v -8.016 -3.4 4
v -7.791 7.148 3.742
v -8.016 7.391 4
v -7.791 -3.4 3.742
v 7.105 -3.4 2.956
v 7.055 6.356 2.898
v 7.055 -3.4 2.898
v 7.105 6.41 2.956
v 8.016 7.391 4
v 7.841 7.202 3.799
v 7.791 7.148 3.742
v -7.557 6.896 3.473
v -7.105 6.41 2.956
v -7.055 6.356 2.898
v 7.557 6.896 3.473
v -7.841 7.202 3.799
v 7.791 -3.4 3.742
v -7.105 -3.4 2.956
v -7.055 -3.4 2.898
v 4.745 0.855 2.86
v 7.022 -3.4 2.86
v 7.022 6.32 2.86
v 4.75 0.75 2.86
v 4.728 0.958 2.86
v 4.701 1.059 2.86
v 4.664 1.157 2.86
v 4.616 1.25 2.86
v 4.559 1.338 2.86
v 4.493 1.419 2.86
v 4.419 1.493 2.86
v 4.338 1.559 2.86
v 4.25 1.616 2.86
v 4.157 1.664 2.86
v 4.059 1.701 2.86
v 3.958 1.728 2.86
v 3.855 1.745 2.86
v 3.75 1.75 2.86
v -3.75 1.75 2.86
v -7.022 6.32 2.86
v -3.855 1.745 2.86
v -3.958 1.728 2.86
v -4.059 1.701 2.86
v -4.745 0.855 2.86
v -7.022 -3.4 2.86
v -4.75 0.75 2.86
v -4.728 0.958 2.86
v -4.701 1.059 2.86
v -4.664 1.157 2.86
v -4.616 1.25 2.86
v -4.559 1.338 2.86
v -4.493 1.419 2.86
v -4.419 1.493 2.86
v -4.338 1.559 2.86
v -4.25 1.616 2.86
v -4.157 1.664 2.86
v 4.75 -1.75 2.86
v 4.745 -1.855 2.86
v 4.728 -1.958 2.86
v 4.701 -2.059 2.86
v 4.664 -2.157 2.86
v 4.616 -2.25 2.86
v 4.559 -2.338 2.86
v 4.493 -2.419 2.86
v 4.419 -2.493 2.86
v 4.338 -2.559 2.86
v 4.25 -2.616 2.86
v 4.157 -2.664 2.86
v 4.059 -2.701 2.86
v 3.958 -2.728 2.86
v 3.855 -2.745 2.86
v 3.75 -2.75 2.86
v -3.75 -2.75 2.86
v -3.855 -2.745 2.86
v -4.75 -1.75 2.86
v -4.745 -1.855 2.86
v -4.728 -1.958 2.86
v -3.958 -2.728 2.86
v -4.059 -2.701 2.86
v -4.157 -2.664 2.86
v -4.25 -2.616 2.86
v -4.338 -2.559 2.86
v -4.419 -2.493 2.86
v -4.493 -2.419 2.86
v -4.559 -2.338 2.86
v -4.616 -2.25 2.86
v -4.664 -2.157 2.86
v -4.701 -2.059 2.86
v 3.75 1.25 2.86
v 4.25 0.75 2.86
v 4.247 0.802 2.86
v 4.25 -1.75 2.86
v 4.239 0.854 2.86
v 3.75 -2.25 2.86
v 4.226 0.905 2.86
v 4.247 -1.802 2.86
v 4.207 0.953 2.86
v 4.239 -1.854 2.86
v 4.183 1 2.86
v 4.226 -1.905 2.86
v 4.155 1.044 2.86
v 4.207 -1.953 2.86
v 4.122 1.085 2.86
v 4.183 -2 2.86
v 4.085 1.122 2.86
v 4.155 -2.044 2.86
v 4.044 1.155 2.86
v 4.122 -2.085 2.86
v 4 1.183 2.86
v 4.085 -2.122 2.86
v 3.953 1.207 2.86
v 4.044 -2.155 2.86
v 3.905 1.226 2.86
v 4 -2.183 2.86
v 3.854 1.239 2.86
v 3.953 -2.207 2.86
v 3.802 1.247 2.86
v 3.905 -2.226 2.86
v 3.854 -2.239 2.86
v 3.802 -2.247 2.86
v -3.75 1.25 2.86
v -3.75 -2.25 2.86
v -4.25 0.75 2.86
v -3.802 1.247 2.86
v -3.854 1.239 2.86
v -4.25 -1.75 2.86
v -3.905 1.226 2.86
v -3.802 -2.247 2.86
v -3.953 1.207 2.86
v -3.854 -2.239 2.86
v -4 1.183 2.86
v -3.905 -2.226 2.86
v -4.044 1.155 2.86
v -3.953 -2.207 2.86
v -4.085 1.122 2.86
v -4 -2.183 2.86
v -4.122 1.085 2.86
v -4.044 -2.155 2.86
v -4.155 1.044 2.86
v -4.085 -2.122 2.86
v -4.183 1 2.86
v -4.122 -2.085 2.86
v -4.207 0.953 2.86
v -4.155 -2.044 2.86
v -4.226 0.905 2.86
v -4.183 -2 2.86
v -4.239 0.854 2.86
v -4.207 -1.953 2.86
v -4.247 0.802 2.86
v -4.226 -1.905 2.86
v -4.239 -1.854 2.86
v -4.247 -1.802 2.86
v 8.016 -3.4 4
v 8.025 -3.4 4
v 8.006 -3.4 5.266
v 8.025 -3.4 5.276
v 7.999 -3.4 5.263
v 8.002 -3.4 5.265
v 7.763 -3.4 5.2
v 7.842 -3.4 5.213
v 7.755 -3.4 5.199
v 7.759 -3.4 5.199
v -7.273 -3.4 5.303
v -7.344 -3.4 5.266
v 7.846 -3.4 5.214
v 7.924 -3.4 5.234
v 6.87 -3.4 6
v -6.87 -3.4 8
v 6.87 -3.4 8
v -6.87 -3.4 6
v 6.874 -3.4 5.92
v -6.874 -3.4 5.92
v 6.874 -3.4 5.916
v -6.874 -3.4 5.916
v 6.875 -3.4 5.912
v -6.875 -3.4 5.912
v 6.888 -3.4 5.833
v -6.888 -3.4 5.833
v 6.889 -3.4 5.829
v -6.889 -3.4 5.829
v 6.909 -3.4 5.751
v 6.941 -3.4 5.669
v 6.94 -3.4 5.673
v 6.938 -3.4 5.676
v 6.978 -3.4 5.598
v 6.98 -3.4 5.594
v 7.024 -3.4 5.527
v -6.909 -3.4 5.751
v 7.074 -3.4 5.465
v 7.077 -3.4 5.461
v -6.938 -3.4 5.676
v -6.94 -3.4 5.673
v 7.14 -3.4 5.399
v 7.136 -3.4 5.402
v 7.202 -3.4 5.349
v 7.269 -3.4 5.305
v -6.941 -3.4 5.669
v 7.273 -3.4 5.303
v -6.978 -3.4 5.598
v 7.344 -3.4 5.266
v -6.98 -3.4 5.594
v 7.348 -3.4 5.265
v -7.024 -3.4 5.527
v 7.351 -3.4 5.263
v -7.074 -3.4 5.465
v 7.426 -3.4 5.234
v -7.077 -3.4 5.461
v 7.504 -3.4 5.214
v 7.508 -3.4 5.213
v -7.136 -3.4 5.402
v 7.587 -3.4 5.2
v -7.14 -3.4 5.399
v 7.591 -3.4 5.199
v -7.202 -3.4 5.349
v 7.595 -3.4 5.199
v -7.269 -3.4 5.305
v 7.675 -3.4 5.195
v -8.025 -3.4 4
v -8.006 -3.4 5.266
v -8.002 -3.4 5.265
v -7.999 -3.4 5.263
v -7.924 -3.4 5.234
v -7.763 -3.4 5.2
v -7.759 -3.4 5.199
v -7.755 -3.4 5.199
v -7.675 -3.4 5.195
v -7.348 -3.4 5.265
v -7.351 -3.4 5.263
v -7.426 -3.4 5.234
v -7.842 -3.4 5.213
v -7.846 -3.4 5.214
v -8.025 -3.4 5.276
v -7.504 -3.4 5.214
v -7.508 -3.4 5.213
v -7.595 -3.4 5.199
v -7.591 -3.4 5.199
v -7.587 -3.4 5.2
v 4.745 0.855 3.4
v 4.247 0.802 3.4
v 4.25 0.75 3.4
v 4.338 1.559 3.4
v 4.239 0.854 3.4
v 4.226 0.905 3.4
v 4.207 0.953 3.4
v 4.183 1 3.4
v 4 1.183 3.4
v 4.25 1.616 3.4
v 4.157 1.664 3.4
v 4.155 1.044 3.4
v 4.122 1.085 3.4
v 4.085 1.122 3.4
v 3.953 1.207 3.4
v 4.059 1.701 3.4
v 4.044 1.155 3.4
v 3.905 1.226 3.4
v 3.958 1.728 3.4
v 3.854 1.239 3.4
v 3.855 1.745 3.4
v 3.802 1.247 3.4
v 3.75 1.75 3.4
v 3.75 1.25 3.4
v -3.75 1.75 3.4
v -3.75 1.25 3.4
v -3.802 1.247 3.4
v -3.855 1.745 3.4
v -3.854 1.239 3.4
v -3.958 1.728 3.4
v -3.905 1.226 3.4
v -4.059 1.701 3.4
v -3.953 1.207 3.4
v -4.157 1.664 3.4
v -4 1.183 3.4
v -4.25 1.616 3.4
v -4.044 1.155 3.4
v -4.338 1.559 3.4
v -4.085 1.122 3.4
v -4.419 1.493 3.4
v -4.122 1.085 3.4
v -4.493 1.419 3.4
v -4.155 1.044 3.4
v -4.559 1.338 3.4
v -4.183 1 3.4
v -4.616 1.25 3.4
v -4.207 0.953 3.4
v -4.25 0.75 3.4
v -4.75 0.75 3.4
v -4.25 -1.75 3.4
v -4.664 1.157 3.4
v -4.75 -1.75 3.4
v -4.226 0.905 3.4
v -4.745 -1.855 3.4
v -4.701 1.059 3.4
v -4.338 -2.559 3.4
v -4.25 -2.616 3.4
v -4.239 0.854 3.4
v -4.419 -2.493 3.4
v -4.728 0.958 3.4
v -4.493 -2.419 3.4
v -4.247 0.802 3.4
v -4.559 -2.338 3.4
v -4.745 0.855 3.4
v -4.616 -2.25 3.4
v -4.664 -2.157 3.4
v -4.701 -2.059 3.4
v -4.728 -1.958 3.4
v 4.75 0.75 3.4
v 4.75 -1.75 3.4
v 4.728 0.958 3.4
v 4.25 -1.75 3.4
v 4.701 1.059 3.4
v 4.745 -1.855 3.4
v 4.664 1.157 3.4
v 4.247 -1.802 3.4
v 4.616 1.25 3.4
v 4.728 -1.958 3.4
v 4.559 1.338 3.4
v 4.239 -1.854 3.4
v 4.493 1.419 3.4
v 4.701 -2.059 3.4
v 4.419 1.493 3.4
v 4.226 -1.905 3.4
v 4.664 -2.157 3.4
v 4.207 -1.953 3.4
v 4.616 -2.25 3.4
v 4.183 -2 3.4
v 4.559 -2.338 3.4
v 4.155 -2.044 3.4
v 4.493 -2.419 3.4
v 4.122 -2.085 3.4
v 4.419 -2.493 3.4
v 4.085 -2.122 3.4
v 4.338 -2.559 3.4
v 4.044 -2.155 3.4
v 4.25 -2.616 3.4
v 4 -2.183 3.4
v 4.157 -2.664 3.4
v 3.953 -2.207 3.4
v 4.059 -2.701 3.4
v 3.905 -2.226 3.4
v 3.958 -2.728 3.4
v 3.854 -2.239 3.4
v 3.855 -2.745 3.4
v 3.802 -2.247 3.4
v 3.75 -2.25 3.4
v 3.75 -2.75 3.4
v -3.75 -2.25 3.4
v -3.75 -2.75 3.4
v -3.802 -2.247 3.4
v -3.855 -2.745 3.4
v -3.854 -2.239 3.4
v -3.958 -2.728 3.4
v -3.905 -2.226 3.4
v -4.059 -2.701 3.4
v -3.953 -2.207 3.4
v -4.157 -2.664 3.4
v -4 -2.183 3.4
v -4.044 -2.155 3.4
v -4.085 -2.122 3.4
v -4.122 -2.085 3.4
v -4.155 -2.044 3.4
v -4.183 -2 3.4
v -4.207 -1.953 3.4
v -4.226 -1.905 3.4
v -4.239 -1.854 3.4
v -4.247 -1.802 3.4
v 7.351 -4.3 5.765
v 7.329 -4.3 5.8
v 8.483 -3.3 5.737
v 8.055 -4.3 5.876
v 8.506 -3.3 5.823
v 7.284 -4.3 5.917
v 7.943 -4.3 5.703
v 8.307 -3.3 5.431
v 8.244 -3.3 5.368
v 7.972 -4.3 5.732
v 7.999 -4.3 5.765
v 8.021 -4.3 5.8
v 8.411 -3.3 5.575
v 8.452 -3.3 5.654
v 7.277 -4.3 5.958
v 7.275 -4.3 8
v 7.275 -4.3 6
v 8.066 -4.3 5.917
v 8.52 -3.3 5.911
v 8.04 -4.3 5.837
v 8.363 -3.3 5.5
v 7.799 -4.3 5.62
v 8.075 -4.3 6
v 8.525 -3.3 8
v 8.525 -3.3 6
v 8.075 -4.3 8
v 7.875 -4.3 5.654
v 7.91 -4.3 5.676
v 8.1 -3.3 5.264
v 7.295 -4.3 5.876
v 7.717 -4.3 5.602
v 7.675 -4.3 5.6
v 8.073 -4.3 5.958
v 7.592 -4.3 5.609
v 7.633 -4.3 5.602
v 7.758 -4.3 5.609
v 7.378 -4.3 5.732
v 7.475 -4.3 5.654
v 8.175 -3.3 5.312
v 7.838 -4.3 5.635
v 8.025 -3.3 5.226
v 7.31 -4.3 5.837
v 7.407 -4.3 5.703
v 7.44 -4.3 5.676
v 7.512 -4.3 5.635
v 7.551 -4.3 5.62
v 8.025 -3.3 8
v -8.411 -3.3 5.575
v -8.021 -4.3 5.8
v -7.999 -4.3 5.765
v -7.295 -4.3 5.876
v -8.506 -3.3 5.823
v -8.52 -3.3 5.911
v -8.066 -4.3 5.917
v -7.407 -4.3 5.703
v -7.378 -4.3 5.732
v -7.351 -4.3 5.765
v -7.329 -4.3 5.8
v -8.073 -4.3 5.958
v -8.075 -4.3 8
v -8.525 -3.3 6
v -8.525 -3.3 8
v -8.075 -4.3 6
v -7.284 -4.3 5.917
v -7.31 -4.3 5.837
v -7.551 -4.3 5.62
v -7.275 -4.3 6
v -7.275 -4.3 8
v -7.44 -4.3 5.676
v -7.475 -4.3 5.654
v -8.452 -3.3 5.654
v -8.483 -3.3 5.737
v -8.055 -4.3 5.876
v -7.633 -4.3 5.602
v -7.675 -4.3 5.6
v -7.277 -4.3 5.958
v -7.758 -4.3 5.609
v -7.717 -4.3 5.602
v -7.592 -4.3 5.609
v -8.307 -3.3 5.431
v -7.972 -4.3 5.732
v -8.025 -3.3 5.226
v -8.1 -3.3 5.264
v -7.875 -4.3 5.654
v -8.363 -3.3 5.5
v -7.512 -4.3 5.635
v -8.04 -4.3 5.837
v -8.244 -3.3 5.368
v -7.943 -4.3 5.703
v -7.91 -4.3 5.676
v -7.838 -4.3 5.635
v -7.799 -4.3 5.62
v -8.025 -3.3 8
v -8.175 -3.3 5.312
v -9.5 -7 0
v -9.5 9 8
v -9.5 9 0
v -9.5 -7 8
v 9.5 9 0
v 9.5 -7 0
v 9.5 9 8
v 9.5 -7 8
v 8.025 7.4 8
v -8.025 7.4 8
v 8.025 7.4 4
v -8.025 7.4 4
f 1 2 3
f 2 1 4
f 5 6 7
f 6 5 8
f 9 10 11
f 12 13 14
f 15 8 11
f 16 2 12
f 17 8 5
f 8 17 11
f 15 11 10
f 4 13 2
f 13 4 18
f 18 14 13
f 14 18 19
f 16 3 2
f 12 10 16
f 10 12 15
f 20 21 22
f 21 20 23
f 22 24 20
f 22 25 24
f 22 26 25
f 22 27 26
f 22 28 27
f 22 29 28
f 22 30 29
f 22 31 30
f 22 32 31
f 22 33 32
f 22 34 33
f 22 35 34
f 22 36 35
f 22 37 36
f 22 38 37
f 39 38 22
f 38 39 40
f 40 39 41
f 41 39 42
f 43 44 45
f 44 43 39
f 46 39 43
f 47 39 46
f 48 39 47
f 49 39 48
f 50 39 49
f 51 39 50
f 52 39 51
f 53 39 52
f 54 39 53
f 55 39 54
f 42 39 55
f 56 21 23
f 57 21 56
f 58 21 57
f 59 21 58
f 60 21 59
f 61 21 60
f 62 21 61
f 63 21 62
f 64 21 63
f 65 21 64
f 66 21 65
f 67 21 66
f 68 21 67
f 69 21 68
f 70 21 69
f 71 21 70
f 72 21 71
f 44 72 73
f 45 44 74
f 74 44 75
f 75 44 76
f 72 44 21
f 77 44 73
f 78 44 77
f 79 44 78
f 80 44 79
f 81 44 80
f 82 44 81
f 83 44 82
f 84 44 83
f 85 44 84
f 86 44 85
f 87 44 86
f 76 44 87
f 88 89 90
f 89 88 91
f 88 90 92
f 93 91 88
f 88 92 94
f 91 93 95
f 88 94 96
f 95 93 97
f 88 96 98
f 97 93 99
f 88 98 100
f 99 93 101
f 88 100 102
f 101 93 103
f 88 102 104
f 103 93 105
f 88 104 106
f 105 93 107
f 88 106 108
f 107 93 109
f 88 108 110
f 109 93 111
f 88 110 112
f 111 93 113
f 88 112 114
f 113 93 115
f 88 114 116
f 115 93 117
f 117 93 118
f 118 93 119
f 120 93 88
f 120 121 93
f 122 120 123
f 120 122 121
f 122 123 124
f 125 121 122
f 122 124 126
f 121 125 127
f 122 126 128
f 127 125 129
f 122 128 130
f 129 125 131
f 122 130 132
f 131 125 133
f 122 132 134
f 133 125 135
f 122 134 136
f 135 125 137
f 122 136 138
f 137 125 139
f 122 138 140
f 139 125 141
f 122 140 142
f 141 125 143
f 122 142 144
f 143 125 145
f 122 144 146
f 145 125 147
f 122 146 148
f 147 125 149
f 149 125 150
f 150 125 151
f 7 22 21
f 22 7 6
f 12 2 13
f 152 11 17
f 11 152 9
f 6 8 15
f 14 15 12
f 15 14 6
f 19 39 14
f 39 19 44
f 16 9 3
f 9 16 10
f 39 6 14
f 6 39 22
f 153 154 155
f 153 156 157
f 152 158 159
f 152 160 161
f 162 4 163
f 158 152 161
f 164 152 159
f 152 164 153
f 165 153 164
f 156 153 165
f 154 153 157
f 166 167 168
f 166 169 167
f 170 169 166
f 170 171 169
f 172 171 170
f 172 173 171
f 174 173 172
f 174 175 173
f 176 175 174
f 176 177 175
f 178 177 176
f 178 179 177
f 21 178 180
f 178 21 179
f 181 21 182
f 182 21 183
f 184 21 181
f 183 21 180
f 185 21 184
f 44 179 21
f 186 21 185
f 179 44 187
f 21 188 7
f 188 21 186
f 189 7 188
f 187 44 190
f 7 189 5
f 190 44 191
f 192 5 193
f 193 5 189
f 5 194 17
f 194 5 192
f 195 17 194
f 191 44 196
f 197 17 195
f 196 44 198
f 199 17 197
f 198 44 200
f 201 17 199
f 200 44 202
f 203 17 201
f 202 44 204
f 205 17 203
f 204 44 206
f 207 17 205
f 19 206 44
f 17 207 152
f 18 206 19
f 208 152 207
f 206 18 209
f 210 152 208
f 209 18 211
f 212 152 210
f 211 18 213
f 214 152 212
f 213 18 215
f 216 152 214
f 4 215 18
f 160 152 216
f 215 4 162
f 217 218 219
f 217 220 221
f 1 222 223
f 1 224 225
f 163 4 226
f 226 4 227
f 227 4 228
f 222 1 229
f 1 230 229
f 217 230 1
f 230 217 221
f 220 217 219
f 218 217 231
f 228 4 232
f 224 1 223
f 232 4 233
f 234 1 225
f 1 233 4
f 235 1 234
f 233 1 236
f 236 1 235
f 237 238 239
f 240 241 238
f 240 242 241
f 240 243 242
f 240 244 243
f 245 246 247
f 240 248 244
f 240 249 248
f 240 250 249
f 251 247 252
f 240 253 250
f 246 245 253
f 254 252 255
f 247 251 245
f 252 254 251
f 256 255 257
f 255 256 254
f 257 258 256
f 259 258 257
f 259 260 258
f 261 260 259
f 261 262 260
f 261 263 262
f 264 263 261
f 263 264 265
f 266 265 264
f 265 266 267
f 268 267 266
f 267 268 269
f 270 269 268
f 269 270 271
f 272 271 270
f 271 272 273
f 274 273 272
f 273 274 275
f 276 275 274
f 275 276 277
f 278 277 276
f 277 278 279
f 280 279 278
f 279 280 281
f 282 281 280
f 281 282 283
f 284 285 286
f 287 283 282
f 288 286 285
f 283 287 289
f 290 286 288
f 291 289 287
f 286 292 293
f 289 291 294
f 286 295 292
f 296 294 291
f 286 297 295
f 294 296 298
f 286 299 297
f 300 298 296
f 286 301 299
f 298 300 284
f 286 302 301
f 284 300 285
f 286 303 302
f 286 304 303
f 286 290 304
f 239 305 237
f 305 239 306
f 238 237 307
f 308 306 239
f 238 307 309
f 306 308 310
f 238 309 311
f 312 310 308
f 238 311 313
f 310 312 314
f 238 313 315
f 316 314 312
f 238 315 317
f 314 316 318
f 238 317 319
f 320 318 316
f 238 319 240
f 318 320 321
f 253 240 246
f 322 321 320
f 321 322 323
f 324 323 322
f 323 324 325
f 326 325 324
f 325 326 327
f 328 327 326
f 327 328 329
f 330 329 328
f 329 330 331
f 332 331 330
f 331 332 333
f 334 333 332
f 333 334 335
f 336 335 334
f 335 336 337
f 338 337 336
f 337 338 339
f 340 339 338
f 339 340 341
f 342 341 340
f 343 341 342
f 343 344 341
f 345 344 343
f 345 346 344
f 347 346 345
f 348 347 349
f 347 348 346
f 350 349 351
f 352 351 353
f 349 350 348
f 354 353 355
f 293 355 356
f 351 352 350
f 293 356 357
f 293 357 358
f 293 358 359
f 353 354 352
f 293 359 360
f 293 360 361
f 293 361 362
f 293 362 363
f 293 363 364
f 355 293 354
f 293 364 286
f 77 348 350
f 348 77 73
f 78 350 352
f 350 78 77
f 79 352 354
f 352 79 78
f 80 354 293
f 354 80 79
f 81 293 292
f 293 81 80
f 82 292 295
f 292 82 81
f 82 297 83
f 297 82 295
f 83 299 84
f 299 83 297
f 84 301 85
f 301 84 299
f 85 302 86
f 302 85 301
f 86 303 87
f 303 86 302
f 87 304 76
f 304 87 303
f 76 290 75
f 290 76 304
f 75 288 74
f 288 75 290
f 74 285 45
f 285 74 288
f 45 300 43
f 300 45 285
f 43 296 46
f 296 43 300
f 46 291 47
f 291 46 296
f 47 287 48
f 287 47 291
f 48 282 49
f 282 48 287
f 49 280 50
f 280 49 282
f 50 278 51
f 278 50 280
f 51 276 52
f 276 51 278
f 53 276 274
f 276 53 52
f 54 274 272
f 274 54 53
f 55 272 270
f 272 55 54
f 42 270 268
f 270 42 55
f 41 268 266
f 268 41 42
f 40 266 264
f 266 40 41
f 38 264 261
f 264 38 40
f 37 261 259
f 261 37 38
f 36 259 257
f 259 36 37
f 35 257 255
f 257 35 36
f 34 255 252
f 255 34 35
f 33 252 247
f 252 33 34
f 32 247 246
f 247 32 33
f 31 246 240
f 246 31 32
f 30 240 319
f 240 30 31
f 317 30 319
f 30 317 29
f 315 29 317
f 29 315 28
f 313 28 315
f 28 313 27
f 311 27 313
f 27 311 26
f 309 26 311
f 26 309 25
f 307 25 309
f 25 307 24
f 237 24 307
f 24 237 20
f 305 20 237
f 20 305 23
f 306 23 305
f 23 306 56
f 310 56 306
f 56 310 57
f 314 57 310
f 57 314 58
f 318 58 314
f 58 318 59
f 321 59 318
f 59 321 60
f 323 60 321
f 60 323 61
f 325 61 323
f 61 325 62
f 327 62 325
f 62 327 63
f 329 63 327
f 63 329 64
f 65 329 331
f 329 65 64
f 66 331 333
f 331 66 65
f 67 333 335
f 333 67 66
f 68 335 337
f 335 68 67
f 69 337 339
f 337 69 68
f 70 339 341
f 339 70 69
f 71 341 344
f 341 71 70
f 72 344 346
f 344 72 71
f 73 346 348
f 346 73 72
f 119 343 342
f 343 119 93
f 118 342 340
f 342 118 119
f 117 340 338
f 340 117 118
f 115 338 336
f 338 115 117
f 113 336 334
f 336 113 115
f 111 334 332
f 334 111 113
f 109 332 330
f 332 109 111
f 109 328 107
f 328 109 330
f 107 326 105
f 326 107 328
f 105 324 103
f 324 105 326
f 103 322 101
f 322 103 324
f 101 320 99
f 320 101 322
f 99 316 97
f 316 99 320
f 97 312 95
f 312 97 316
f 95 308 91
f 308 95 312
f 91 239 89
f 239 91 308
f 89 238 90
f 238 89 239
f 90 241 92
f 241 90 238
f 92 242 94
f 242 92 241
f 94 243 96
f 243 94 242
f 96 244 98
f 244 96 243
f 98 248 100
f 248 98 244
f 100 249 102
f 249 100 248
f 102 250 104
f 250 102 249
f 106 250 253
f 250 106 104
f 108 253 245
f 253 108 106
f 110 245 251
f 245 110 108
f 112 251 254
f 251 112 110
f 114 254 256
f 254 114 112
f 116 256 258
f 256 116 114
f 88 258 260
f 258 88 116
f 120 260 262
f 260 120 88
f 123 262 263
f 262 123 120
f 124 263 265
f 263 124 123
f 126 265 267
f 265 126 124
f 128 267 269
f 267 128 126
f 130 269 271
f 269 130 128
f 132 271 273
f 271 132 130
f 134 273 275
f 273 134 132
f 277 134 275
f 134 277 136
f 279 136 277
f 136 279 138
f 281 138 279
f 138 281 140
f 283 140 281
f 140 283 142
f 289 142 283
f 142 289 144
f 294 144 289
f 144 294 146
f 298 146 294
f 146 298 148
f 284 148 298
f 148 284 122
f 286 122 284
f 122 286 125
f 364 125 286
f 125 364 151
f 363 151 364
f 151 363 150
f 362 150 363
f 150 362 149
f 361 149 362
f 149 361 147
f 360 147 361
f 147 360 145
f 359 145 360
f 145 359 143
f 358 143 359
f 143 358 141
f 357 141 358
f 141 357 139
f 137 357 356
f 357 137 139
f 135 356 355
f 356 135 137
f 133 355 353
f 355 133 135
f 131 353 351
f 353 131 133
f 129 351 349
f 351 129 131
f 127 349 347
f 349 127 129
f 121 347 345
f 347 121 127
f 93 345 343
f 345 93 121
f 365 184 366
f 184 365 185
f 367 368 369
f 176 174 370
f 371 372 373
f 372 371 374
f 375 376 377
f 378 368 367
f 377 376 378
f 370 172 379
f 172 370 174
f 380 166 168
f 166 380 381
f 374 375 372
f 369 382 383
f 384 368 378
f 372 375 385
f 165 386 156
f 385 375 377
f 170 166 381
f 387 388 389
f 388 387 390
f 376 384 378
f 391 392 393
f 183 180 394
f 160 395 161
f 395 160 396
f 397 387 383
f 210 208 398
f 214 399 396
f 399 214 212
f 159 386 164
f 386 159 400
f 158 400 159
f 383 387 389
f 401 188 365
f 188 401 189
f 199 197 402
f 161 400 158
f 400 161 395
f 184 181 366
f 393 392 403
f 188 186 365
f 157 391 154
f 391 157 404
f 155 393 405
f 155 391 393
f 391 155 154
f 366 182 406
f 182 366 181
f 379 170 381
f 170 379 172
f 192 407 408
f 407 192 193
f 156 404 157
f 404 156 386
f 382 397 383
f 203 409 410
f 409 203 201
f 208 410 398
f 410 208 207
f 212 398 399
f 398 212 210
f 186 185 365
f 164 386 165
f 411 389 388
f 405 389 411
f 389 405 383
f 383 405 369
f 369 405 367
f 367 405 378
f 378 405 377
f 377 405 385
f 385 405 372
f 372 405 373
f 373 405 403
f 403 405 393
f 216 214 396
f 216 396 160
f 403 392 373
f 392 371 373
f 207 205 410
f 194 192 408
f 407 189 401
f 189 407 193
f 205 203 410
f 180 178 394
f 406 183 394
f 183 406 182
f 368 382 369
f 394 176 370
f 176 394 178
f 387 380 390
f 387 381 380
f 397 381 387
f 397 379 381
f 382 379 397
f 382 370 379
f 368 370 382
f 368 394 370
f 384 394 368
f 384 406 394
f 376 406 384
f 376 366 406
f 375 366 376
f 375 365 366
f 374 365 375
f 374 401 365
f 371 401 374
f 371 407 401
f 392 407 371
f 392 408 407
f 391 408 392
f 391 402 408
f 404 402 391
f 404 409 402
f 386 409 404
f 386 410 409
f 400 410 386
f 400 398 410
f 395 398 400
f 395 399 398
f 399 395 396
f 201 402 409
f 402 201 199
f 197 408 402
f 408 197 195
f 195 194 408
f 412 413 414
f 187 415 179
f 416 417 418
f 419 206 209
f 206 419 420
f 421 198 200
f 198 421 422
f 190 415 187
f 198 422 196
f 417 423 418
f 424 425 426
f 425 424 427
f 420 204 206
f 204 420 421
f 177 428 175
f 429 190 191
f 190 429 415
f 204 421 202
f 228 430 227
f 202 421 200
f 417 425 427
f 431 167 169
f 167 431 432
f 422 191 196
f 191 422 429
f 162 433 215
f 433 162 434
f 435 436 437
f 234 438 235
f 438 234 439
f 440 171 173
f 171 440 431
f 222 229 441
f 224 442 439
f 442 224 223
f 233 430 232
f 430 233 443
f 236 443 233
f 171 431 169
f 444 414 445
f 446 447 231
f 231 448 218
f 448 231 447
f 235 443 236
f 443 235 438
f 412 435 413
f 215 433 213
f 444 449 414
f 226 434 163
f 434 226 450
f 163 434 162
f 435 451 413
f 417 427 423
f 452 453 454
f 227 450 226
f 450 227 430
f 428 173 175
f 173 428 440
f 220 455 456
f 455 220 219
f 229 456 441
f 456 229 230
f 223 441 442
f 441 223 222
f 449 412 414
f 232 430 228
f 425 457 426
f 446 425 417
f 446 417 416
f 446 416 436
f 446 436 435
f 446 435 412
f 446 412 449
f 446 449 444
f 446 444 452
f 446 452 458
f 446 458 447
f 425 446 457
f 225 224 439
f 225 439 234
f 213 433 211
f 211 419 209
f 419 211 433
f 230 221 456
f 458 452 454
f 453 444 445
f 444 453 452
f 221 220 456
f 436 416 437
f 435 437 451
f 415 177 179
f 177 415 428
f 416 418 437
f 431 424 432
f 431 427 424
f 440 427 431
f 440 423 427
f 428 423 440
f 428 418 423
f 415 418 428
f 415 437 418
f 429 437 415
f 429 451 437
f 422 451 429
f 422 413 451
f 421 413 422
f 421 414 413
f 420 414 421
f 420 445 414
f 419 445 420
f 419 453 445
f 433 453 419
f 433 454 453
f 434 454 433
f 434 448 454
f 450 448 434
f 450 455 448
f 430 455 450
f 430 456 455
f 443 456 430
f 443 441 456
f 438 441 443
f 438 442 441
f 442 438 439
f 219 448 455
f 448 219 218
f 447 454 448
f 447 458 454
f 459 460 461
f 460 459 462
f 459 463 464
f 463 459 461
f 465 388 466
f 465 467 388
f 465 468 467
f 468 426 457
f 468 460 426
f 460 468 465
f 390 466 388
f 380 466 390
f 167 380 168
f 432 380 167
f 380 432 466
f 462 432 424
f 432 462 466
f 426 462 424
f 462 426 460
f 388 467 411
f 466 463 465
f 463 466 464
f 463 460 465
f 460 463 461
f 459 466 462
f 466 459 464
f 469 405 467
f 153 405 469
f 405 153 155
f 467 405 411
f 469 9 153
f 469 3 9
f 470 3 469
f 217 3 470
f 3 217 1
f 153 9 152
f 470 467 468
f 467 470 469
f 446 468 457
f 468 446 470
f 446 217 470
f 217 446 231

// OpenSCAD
// Print head cap for the Canon BC-01 and compatible cartridge
// Copyright François Revol, 2026


head_bbox = [16.1,12,4.8];

bbox = [20-1,16,8];

//if ($preview) color("orange", 0.4) translate([0,0,head_bbox.z/2]) cube(head_bbox, center=true);


//if ($preview) color("green", 0.4) translate([0,-4/2,bbox.z/2]) cube(bbox, center=true);

$fn = 60;

translate([0,0,8]) rotate([0,180,0]) difference() {
    translate([0,1,bbox.z/2]) cube(bbox, center=true);
    //4.95
    translate([0,4/2,-0.01]) linear_extrude(4.01) {
        square([16.05,10.8], center=true);
    }
    difference() {
        translate([0,4/2-10.8/2,4-0.01]) linear_extrude(0.95+0.2, scale=[14/16,9/10]) {
            translate([0,10.8/2]) square([16.05,10.8], center=true);
        }
        translate([0,-0.5,4.6]) linear_extrude(1.1) difference() {
            offset(1) square([7.5,2.5], center=true);
            offset(0.5) square([7.5,2.5], center=true);
        }
    }
    for(dx=[-1,1])
        translate([dx*(16.05-1.7+1)/2,-3.3,0]) rotate([90,0,0])
        hull() for(dy=[-1,1]) translate([0,dy*2,0]) cylinder(d1=1.7,d2=0.8, h=1);
}
